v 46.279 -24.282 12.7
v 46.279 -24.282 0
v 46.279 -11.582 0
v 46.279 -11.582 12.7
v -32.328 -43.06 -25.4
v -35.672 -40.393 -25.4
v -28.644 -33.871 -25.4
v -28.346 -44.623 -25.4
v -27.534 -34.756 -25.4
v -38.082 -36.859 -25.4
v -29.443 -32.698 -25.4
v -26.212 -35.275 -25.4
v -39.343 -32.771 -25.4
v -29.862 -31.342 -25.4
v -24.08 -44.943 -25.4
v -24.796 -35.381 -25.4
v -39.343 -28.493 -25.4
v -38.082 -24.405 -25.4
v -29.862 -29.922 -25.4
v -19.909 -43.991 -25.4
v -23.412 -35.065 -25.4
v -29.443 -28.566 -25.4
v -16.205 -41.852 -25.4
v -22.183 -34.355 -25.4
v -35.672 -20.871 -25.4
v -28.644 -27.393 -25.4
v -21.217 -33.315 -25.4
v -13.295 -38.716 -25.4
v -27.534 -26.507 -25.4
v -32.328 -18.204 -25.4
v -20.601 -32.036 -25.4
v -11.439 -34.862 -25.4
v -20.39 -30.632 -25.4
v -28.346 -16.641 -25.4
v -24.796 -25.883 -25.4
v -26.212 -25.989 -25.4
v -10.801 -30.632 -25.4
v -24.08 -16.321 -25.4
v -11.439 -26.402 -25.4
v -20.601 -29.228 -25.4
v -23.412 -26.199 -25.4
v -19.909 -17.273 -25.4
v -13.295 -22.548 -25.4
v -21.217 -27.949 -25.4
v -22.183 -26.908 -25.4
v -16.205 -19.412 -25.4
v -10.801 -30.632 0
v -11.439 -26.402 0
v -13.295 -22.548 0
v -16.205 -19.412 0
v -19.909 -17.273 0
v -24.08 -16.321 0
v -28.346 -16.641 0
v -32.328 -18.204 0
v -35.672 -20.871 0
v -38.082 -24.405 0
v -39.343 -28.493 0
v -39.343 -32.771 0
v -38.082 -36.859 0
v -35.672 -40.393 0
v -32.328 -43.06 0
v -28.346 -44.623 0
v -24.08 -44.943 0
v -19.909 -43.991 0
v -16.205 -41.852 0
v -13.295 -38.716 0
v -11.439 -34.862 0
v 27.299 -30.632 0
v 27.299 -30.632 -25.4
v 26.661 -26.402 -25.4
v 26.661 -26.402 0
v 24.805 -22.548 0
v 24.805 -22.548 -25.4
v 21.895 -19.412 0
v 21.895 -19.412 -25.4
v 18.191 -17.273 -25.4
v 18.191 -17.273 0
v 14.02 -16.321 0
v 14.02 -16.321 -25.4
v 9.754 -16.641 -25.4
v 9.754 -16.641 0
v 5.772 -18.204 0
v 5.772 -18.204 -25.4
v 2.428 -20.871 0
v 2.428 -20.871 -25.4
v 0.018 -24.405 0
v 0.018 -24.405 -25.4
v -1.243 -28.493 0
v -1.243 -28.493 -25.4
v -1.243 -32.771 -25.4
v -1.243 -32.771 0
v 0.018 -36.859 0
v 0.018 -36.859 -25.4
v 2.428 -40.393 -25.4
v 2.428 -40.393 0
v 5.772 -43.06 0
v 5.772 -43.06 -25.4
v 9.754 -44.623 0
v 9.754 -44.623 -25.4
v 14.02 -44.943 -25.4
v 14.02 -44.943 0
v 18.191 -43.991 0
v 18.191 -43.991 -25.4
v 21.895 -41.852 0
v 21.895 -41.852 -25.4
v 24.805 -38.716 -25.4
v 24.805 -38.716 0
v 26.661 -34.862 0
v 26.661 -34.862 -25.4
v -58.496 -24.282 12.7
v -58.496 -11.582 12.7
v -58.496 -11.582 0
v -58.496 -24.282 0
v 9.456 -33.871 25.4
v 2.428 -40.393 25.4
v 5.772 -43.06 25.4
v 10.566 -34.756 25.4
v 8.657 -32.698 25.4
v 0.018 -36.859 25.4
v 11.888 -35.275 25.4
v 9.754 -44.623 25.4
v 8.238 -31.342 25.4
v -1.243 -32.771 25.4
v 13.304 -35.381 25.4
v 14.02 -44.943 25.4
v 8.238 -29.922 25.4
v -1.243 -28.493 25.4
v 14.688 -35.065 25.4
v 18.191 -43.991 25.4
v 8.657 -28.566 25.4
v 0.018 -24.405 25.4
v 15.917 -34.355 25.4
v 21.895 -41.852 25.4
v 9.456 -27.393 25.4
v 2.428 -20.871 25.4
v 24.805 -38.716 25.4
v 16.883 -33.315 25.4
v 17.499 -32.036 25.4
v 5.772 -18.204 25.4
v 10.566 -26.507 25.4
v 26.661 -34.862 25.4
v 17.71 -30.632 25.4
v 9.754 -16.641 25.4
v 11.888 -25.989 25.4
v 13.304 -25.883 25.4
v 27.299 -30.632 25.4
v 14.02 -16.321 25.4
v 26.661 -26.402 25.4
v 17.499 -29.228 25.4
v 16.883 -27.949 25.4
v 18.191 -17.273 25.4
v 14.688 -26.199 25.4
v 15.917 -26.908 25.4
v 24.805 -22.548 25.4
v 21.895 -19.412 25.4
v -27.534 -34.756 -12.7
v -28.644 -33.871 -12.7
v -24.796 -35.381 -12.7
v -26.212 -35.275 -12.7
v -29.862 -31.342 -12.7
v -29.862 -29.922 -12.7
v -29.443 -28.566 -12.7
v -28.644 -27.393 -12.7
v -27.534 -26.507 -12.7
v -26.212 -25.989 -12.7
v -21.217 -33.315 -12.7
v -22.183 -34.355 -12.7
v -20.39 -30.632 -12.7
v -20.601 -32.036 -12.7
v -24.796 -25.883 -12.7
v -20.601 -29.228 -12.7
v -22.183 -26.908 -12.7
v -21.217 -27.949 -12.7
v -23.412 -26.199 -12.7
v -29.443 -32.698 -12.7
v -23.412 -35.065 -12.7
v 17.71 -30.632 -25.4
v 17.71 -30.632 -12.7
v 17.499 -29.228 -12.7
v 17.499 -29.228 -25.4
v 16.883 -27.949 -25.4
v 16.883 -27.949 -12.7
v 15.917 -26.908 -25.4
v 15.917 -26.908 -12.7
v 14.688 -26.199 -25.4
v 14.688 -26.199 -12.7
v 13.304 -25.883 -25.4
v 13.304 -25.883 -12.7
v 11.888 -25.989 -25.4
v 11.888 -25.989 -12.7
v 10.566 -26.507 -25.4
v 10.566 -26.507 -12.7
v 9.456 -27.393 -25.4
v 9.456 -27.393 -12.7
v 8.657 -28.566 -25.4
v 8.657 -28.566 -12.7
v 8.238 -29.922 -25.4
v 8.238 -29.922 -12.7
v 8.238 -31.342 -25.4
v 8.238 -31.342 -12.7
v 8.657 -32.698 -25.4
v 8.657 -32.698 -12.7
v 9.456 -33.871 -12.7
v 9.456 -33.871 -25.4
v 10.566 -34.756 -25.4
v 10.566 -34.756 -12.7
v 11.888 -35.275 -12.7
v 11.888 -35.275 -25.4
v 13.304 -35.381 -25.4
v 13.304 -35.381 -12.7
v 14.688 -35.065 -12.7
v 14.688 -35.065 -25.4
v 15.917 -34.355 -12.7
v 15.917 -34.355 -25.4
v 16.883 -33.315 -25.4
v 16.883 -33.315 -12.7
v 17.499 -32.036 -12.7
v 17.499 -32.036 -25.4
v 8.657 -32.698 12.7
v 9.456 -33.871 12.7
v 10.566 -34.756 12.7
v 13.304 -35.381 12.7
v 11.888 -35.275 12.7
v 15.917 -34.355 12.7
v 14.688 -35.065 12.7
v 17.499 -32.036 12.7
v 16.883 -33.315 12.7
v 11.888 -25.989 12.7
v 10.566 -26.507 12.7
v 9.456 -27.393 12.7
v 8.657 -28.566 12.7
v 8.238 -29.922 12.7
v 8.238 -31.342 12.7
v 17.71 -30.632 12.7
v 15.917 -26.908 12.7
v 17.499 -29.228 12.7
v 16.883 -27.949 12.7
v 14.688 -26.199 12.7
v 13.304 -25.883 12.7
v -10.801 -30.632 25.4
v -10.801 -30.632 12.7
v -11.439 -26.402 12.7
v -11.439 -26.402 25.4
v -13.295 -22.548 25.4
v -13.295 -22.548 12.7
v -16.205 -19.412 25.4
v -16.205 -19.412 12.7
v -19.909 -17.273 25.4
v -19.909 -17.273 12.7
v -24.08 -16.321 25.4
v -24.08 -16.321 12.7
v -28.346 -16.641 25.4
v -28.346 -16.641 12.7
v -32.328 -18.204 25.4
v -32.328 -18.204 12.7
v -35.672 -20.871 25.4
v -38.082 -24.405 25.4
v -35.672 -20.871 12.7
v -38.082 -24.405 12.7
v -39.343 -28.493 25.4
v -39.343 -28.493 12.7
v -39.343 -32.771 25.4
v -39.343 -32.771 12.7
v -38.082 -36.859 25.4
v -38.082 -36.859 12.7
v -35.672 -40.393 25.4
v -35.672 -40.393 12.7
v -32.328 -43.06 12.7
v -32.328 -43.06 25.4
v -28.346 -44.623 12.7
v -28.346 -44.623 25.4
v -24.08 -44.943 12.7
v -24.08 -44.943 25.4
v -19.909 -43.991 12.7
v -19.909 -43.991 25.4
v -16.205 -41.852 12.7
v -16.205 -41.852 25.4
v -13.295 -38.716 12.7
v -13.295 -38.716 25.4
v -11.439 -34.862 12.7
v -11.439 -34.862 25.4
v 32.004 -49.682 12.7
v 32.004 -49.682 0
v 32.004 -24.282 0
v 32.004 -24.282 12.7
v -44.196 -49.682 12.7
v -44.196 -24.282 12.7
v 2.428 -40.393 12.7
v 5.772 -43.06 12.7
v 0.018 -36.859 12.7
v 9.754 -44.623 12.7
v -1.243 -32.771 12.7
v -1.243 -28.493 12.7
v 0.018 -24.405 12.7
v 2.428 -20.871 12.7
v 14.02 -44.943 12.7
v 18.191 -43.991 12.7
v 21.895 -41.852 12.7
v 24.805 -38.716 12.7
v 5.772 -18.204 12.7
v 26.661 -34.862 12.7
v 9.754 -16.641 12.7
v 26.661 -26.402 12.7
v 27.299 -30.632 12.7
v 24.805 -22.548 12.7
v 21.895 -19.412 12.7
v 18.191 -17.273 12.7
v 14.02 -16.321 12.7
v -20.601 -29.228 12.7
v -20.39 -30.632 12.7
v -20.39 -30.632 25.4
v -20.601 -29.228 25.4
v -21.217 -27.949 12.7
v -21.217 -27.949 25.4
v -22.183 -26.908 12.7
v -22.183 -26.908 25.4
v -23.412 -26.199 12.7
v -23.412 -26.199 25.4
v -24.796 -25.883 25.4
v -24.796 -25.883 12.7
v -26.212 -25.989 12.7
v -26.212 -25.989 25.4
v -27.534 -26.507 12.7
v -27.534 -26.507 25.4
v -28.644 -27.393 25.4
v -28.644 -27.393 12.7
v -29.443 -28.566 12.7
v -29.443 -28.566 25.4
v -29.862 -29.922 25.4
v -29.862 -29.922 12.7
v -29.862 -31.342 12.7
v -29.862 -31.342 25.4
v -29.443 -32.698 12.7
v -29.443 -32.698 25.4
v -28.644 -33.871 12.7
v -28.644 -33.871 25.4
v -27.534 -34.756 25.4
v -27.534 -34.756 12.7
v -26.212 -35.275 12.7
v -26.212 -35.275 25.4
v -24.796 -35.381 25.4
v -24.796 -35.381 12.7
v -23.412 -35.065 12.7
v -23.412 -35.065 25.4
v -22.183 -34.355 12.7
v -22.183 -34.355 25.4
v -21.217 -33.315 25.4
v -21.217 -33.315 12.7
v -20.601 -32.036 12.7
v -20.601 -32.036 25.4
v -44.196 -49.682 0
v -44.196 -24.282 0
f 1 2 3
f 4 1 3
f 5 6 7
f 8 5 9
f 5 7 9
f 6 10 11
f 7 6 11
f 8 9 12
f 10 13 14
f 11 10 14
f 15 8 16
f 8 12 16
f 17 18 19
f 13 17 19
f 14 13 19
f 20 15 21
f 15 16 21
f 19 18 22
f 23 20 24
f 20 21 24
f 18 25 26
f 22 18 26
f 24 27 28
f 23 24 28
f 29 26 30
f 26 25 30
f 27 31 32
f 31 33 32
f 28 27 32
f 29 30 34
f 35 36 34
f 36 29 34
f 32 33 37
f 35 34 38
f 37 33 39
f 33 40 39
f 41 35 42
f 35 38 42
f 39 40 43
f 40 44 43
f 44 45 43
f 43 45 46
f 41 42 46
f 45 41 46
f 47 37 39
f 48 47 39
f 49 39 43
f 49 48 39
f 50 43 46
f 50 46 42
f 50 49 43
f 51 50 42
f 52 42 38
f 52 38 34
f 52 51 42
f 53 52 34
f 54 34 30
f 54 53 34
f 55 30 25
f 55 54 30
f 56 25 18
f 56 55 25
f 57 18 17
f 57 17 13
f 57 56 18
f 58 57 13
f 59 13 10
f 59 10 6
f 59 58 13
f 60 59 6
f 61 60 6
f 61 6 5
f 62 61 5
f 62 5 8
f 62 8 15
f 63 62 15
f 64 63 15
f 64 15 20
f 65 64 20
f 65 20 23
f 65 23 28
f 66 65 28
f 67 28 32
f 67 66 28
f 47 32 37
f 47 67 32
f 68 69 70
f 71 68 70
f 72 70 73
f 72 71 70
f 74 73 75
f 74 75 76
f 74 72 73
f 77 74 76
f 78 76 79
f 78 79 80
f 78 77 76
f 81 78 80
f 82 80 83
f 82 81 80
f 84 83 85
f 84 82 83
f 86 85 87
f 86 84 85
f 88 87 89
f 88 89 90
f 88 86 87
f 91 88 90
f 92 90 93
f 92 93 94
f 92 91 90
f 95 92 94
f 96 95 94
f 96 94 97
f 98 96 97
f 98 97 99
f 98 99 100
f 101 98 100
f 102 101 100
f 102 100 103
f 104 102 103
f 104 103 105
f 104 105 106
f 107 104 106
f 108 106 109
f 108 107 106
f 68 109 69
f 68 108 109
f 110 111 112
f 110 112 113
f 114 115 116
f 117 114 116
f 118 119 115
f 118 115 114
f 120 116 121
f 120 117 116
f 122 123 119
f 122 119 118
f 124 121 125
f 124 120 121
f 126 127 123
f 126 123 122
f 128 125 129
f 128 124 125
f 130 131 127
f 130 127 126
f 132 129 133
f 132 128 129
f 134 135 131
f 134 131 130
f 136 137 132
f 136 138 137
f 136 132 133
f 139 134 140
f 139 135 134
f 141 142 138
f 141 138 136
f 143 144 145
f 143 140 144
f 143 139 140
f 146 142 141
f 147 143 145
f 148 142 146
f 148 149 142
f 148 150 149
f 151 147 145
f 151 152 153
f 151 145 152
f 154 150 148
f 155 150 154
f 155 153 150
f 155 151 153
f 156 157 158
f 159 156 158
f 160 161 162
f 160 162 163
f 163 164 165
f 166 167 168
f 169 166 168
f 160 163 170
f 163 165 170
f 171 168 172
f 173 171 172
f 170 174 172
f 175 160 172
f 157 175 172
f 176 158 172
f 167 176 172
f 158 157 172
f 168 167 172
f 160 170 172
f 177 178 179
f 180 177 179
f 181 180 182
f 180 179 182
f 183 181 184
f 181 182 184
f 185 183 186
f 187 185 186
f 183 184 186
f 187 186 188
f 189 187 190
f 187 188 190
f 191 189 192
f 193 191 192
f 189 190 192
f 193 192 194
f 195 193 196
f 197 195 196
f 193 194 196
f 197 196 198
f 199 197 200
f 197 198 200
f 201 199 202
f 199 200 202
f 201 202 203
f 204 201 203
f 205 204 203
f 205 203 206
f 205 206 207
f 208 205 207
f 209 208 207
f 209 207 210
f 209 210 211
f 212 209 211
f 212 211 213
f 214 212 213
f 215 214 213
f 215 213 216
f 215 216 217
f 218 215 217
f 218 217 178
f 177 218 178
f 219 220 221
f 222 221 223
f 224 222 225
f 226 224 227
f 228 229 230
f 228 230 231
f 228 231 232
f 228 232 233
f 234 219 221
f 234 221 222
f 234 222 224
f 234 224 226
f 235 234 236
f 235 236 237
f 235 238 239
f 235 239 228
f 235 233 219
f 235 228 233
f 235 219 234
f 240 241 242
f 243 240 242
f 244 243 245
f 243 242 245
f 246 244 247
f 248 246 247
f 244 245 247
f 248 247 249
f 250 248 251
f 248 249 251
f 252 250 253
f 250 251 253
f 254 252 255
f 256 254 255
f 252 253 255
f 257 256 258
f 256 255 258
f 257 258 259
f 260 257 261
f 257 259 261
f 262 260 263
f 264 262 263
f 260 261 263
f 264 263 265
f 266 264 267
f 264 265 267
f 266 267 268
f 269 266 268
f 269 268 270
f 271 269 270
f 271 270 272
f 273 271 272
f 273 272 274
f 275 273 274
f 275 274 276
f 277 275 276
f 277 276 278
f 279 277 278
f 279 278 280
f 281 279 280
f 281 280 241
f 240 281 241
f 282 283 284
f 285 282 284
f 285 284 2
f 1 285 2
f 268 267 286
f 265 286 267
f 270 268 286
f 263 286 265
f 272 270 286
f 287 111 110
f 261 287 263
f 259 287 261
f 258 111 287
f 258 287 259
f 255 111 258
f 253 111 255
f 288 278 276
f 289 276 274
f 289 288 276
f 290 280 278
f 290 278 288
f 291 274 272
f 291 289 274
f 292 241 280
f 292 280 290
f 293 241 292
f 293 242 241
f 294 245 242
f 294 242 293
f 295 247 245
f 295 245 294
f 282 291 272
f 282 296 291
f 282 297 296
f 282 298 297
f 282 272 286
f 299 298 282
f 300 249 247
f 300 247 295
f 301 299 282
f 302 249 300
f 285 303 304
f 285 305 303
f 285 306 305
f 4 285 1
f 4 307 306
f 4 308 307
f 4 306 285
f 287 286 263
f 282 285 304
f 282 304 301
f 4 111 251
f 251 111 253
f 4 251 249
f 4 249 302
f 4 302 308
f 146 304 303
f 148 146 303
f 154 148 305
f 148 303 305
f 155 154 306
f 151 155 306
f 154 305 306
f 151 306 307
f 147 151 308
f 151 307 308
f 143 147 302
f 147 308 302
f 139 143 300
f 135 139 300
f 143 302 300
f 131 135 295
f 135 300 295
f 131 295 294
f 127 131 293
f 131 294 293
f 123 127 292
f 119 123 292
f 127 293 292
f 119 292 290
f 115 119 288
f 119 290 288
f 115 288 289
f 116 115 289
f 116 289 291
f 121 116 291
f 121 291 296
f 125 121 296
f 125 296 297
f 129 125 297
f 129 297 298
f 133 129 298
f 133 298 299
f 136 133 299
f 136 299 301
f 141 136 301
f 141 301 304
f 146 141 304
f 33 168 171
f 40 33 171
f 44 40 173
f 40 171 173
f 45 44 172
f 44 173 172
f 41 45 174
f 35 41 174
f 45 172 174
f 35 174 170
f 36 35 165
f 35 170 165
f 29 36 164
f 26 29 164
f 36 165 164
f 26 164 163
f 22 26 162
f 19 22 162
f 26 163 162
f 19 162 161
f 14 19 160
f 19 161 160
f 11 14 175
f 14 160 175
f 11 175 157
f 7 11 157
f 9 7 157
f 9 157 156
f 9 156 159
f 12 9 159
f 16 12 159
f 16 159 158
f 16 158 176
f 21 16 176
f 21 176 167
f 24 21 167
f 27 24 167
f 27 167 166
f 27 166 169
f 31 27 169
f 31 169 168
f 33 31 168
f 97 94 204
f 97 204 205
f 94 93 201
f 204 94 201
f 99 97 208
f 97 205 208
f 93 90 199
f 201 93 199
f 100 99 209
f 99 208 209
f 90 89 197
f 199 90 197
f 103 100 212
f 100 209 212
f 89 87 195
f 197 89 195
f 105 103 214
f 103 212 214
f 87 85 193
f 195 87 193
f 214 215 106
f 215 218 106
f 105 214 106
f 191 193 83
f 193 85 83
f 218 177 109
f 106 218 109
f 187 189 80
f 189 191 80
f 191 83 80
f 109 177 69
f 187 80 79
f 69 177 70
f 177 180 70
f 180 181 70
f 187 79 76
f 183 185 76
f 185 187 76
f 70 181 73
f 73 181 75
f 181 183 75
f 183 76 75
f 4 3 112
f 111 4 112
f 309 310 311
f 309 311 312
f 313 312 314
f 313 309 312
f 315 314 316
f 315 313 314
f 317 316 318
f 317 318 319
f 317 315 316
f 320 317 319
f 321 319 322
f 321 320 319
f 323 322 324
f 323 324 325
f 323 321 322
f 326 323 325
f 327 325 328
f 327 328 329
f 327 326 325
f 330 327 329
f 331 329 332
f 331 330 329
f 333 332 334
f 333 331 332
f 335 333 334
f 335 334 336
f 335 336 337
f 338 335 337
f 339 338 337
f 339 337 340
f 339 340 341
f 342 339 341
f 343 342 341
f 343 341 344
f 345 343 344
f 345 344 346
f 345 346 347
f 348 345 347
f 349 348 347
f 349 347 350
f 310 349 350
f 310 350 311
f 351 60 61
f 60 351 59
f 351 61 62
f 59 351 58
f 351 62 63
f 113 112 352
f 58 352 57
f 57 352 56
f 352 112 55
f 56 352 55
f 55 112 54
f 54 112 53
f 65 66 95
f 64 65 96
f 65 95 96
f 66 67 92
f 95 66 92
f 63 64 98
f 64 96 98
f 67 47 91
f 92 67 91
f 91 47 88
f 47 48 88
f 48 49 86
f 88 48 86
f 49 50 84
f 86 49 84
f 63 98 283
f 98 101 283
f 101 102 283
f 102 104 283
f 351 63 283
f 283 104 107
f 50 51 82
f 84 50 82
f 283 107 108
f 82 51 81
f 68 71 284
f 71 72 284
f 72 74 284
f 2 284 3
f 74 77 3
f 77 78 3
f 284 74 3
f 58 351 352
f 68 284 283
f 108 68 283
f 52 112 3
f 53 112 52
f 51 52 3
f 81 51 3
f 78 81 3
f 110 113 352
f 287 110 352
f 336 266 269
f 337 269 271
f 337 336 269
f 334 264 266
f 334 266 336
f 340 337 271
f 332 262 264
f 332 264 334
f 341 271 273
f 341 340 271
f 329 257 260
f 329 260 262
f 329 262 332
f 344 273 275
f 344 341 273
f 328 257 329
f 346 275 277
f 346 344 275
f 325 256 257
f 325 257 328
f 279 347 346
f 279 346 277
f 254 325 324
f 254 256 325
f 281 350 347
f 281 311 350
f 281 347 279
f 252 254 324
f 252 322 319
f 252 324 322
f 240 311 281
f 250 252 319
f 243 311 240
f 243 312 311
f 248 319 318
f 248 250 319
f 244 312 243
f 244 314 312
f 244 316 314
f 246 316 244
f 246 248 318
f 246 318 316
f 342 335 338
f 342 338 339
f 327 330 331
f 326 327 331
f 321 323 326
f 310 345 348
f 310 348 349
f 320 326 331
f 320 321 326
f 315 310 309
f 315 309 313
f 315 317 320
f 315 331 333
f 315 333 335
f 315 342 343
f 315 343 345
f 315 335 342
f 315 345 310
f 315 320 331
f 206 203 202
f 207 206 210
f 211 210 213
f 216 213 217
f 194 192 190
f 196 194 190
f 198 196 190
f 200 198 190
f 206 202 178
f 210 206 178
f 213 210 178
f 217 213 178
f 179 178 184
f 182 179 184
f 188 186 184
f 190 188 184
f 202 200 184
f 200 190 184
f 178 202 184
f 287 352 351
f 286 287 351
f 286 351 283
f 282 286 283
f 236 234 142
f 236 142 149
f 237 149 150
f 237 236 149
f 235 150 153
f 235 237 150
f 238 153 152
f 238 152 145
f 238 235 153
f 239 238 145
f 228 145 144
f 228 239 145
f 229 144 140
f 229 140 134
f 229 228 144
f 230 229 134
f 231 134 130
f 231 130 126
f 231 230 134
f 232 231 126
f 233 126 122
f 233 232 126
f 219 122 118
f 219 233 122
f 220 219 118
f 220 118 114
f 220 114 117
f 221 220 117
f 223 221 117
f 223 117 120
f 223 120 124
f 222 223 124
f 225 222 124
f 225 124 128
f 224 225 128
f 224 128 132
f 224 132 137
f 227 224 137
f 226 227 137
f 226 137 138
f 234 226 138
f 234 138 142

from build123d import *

# Parameters (mm, degrees)
F0_R          = 14.351
F1_DEPTH      = 12.7
F0_R_2        = 4.7625
F2_DEPTH      = 25.4
F2_DEPTH_BACK = 25.4
F3_DEPTH      = 12.7
F3_DEPTH_BACK = 12.7


with BuildPart() as f1:
    # F0 (on Top) → F1 (new body)
    with BuildSketch(Plane.XY):
        Polygon((-44.196002, -24.281906), (-44.196002, -49.681906), (32.003998, -49.681906), (32.003998, -24.281906), (46.278798, -24.281906), (46.278798, -11.581906), (-58.496202, -11.581906), (-58.496202, -24.281906), align=None)
        with Locations((-25.152352, -30.631906)):
            Circle(F0_R, mode=Mode.SUBTRACT)
        with Locations((12.947648, -30.631906)):
            Circle(F0_R, mode=Mode.SUBTRACT)
    extrude(amount=F1_DEPTH)

    # F0 (on Top) → F2 (join, two sides)
    with BuildSketch(Plane.XY) as f2_sk:
        with Locations((-25.152352, -30.631906)):
            Circle(F0_R)
        with Locations((-25.152352, -30.631906)):
            Circle(F0_R_2, mode=Mode.SUBTRACT)
        with Locations((12.947648, -30.631906)):
            Circle(F0_R)
        with Locations((12.947648, -30.631906)):
            Circle(F0_R_2, mode=Mode.SUBTRACT)
    extrude(amount=F2_DEPTH)
    extrude(f2_sk.sketch, amount=-F2_DEPTH_BACK)

    # F0 (on Top) → F3 (join, two sides)
    with BuildSketch(Plane.XY) as f3_sk:
        with Locations((-25.152352, -30.631906)):
            Circle(F0_R_2)
        with Locations((12.947648, -30.631906)):
            Circle(F0_R_2)
    extrude(amount=F3_DEPTH)
    extrude(f3_sk.sketch, amount=-F3_DEPTH_BACK)


solid = f1.part
